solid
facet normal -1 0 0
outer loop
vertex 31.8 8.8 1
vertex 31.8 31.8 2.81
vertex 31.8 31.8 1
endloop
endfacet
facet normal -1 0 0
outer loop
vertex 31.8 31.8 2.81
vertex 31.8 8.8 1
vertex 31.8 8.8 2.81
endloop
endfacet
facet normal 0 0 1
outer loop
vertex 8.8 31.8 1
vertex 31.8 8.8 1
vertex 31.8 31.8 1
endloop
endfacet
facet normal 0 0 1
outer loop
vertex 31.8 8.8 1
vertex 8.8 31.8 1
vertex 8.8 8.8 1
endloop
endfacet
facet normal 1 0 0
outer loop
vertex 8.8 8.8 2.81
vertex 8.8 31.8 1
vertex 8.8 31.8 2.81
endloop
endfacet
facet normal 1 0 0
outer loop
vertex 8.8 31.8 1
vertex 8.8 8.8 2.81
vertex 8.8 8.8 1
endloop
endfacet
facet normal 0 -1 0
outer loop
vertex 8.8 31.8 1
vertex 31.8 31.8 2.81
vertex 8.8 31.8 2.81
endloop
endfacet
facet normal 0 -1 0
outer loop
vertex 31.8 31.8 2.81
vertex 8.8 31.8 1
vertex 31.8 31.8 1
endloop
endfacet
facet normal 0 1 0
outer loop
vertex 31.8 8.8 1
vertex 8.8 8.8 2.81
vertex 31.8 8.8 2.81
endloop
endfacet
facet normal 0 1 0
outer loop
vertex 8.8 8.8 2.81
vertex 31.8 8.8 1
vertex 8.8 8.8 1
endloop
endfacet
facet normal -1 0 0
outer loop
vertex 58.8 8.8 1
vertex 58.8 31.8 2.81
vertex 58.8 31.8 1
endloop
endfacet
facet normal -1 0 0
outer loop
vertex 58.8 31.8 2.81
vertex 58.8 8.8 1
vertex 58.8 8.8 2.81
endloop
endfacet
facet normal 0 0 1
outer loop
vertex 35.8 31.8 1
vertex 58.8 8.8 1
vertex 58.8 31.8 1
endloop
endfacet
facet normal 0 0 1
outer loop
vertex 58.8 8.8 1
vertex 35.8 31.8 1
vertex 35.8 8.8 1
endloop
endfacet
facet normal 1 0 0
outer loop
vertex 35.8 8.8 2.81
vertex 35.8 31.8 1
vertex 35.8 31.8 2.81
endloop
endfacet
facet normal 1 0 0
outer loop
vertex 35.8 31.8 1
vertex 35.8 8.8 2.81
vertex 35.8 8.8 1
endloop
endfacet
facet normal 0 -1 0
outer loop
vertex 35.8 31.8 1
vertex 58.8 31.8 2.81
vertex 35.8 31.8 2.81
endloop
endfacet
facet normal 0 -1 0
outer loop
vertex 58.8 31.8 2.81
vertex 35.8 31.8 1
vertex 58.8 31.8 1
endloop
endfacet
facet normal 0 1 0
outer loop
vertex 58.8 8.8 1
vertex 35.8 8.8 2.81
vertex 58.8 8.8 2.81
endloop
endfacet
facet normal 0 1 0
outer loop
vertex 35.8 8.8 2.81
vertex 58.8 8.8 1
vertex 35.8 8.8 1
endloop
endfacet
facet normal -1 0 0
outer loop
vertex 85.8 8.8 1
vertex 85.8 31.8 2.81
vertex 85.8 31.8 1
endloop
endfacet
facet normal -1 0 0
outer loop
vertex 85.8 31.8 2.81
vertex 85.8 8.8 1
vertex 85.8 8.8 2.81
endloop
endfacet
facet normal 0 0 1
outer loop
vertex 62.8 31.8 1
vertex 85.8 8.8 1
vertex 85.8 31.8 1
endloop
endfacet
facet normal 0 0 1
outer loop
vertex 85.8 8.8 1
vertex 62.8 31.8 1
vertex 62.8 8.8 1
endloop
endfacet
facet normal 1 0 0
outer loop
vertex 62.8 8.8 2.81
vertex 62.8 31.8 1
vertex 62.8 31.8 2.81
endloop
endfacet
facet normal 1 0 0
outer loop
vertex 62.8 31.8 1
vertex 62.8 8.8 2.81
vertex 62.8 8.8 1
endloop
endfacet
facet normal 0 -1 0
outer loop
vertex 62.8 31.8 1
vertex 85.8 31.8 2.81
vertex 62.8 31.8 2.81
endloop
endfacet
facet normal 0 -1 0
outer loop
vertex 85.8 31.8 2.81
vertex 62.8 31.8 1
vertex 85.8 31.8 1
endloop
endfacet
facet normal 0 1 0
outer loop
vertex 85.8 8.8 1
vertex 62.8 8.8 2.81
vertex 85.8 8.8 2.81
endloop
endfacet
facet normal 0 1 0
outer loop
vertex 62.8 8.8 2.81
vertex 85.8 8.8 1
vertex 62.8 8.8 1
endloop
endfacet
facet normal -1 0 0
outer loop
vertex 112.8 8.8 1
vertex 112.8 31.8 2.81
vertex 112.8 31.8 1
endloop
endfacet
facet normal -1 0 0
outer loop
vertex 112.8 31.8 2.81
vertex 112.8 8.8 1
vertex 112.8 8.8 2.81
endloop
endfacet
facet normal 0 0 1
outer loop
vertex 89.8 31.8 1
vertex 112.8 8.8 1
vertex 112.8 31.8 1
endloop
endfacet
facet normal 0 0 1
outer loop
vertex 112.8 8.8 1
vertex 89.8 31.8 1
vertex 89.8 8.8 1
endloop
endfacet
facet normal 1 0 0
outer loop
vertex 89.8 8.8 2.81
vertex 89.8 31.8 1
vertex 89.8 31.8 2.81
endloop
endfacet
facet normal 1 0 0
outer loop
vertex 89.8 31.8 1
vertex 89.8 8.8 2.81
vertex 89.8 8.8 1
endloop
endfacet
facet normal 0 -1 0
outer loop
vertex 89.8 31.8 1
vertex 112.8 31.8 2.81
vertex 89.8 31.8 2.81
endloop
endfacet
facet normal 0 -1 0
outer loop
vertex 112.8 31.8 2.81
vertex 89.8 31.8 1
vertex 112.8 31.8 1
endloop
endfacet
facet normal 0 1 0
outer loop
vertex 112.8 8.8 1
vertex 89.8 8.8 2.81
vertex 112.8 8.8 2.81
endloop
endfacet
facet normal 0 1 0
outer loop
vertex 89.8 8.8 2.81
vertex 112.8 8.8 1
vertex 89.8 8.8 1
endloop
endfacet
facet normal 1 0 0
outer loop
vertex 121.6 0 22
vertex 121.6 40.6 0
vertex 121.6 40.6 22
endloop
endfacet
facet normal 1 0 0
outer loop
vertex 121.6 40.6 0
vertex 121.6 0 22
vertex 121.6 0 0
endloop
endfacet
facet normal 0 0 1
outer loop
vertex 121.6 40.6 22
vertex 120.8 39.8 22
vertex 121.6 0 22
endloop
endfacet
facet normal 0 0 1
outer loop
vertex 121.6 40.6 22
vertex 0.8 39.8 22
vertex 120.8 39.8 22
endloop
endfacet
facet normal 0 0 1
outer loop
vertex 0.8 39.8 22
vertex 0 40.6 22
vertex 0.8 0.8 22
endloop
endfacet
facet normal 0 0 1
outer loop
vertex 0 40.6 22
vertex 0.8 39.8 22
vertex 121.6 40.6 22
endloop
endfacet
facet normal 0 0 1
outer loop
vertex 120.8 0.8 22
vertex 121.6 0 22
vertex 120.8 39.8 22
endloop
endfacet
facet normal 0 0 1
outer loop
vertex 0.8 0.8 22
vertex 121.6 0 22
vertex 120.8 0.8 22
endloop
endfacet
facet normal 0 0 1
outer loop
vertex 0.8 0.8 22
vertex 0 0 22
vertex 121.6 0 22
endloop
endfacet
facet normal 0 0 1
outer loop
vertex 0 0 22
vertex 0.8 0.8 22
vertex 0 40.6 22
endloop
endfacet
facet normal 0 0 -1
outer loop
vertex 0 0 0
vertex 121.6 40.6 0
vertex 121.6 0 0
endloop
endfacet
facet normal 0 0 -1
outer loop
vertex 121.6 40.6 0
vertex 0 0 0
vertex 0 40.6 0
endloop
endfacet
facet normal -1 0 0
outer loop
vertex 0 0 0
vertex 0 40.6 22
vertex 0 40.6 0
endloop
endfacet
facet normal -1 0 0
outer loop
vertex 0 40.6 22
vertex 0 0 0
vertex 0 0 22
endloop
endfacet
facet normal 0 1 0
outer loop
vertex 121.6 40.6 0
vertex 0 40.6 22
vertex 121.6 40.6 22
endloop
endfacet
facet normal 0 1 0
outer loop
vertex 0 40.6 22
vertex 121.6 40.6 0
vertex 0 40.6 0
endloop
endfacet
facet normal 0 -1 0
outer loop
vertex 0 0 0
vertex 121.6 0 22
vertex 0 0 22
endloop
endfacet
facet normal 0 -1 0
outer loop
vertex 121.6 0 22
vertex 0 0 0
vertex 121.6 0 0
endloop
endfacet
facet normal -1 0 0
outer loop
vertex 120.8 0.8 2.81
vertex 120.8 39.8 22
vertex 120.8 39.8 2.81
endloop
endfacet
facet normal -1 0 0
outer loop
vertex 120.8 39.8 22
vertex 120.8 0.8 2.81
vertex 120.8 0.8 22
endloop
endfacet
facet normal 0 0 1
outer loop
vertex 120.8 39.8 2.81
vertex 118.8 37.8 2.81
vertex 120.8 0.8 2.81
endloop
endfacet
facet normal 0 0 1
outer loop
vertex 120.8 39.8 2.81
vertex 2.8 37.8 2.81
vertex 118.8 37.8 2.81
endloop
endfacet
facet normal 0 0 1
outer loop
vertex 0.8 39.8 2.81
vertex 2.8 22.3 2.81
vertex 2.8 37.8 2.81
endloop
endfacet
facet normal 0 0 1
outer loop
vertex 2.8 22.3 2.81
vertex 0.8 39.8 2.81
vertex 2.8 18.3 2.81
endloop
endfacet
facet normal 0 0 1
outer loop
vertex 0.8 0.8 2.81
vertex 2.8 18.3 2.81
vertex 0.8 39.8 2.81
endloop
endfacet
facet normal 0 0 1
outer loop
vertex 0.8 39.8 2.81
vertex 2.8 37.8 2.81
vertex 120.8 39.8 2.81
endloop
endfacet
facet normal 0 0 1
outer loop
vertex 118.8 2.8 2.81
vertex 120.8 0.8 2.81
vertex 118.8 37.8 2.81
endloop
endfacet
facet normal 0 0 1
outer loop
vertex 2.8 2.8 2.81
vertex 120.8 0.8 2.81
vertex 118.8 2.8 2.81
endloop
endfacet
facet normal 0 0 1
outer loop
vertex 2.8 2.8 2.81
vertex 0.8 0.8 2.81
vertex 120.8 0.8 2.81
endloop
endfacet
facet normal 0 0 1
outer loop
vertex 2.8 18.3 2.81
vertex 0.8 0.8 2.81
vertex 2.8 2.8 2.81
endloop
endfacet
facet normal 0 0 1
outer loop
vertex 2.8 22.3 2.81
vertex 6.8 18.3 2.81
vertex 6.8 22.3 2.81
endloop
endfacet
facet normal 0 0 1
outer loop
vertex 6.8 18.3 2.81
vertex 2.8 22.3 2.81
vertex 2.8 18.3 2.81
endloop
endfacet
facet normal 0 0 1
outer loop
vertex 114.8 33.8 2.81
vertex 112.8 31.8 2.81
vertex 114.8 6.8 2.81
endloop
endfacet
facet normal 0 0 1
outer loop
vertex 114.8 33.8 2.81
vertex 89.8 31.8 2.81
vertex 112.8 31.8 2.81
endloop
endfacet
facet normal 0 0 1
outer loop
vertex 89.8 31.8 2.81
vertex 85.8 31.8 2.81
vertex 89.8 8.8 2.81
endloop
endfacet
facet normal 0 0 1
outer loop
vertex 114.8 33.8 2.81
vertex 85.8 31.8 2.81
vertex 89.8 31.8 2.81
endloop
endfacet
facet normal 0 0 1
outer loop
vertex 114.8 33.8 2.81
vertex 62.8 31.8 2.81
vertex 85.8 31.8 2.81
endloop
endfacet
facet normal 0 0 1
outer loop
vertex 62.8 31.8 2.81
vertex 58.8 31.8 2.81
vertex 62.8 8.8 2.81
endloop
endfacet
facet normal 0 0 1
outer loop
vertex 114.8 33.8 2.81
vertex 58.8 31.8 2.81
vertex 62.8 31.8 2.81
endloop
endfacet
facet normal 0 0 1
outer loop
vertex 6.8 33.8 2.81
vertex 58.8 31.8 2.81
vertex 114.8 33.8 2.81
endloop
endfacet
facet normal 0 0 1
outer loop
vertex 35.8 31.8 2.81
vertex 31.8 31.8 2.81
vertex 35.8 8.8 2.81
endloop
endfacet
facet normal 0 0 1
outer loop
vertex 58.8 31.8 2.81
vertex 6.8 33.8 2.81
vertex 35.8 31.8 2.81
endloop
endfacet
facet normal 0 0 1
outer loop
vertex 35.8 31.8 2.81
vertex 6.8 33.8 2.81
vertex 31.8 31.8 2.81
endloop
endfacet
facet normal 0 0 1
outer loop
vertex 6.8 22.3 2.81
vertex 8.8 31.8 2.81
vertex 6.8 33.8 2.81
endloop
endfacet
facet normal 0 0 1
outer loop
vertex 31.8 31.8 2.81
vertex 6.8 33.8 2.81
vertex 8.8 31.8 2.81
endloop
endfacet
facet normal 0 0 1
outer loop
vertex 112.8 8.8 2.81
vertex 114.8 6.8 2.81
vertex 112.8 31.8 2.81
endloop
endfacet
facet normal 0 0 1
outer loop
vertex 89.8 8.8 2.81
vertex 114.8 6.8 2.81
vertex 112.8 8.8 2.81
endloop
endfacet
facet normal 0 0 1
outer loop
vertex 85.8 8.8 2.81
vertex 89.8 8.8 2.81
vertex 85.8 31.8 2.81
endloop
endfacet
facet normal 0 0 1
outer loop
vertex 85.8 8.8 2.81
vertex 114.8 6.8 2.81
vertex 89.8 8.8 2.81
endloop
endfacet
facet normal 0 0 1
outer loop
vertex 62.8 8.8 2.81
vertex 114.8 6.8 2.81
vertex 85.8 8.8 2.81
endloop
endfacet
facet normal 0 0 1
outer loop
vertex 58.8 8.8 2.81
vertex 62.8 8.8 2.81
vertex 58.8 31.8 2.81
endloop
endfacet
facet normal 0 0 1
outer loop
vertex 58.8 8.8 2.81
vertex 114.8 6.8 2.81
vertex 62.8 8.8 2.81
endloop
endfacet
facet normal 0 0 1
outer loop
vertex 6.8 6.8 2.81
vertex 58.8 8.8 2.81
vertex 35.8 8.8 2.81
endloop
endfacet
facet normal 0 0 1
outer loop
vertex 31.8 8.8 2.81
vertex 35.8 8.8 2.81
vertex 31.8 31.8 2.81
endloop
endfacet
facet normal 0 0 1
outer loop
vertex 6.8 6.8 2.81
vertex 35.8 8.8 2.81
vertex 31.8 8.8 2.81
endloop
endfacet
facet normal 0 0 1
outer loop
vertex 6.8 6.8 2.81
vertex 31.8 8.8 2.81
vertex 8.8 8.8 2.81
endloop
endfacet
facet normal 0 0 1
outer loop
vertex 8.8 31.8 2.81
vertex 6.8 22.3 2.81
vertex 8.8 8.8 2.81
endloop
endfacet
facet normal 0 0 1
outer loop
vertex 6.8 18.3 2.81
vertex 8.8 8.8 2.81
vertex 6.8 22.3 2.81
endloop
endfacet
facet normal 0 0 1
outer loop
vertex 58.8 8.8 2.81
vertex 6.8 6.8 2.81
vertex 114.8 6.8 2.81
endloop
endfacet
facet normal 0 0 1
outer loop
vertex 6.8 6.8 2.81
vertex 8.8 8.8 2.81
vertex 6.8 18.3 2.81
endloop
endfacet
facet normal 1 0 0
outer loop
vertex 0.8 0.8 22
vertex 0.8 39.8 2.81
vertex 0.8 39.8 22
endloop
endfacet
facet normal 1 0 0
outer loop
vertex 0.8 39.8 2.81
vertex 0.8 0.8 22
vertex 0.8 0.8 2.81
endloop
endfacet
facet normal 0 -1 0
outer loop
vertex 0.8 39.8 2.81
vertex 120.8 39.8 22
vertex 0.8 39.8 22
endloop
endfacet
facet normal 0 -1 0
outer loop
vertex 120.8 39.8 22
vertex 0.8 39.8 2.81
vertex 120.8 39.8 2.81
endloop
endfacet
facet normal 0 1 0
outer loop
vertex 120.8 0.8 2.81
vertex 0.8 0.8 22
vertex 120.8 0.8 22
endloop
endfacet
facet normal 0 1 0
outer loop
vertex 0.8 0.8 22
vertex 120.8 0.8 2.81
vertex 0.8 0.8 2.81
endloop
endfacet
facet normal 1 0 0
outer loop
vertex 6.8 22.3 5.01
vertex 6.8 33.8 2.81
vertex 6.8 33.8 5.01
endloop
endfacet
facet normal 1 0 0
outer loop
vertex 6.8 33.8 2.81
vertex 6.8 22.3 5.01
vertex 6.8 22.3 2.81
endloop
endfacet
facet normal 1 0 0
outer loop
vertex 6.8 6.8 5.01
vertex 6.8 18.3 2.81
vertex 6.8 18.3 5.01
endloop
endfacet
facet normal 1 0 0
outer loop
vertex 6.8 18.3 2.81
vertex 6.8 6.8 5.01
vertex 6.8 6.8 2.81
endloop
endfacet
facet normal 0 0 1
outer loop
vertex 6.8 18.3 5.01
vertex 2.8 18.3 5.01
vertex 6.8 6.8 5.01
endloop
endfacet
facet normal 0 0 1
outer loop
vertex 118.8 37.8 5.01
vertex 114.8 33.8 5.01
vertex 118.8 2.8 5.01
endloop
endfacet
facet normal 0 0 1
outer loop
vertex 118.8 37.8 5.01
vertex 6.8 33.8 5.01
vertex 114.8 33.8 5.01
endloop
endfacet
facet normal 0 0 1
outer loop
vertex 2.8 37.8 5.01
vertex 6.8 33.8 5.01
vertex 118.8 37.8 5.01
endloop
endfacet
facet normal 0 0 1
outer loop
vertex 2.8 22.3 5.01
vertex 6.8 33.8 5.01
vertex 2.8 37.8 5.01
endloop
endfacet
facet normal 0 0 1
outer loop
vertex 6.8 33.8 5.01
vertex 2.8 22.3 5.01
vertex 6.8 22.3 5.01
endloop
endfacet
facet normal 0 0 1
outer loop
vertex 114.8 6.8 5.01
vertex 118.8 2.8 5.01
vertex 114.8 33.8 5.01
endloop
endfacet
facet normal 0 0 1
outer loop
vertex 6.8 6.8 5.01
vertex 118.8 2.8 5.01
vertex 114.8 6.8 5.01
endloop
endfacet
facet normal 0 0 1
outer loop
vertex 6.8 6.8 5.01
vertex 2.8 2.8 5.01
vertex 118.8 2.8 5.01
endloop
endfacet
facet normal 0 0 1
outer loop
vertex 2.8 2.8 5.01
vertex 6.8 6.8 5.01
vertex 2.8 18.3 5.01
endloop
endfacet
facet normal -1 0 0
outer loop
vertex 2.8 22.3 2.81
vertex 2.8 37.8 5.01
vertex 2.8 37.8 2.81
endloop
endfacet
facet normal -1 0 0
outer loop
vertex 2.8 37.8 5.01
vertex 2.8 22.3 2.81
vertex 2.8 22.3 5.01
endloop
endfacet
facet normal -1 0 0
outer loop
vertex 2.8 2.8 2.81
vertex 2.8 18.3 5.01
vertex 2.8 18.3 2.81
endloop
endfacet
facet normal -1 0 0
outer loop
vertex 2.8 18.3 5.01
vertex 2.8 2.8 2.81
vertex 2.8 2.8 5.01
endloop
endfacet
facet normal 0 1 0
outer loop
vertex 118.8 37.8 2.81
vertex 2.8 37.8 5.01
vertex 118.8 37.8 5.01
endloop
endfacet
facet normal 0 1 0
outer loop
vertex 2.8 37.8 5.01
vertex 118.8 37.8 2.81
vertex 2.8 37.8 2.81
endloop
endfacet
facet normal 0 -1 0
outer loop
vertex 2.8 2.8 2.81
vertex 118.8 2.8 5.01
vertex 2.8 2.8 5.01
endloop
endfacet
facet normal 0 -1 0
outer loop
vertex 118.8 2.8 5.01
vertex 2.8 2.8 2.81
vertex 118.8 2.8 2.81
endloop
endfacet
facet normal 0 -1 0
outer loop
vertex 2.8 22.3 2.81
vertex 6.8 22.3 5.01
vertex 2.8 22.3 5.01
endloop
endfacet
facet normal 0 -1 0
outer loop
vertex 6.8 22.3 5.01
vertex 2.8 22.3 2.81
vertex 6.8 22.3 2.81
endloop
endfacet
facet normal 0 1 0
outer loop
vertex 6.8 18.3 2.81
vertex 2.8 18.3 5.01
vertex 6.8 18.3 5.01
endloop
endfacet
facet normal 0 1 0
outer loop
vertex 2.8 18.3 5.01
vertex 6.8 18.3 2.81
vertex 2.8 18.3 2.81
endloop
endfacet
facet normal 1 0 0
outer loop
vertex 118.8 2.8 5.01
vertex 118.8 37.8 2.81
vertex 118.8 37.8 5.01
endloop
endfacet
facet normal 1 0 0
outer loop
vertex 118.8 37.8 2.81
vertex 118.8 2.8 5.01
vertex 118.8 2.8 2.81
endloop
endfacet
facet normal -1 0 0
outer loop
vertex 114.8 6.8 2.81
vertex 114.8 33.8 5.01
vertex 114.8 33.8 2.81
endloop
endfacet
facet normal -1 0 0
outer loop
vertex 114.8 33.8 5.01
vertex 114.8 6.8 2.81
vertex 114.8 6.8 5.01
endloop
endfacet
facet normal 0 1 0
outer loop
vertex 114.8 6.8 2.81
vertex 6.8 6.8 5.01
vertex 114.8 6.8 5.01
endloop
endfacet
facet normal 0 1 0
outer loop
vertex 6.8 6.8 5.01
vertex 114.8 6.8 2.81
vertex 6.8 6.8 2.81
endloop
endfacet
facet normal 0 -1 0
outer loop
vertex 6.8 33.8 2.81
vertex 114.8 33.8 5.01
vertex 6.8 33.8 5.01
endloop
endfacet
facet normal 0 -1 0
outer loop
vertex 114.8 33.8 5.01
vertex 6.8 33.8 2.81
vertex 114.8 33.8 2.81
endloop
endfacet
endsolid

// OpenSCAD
//units are in mm
$fn=20;

// Epsilon value
e = 0.01;

// Wall thickness
wall = .8;

// Outer border width
border = 8;

// Registration indent width
indent = 4;

// Number of buttons
n = 4;

// Button size constants
button_width = 23;
button_length = 23;
button_height = 22;

box_width = 2*wall + 2*border + button_width * n + indent * (n-1);
box_length = 2*wall + 2*border + button_length;

difference() {
    // Bounding box
    cube([box_width, box_length, button_height]);

    // Hollow out box
    translate([wall, wall, 2 + wall + e])
        cube([box_width - 2*wall, box_length - 2*wall, button_height]);

    translate([wall + border, wall + border, 1]) {
        for(i=[0:n-1]) {
            translate([i * (button_width + indent), 0, 0])
                cube([button_width, button_length, button_height]);
        }
    }
}

difference() {
    translate([wall + (border - indent)/2, wall + (border - indent)/2, e])
        cube([indent, box_length - 2*wall - indent, 5]);
    translate([(border-indent)/2 + wall - e, box_length/2 - indent/2, 2+wall])
        cube([indent + 2*e, indent, button_height]);
}
translate([box_width - wall - (border+indent)/2, wall + (border - indent)/2, e])
    cube([indent, box_length - 2*wall - indent, 5]);
translate([wall + (border - indent)/2, wall + (border - indent)/2, e])
    cube([box_width - 2*wall - indent, indent, 5]);
translate([wall + (border - indent)/2, box_length - wall - (border + indent)/2, e])
    cube([box_width - 2*wall - indent, indent, 5]);
